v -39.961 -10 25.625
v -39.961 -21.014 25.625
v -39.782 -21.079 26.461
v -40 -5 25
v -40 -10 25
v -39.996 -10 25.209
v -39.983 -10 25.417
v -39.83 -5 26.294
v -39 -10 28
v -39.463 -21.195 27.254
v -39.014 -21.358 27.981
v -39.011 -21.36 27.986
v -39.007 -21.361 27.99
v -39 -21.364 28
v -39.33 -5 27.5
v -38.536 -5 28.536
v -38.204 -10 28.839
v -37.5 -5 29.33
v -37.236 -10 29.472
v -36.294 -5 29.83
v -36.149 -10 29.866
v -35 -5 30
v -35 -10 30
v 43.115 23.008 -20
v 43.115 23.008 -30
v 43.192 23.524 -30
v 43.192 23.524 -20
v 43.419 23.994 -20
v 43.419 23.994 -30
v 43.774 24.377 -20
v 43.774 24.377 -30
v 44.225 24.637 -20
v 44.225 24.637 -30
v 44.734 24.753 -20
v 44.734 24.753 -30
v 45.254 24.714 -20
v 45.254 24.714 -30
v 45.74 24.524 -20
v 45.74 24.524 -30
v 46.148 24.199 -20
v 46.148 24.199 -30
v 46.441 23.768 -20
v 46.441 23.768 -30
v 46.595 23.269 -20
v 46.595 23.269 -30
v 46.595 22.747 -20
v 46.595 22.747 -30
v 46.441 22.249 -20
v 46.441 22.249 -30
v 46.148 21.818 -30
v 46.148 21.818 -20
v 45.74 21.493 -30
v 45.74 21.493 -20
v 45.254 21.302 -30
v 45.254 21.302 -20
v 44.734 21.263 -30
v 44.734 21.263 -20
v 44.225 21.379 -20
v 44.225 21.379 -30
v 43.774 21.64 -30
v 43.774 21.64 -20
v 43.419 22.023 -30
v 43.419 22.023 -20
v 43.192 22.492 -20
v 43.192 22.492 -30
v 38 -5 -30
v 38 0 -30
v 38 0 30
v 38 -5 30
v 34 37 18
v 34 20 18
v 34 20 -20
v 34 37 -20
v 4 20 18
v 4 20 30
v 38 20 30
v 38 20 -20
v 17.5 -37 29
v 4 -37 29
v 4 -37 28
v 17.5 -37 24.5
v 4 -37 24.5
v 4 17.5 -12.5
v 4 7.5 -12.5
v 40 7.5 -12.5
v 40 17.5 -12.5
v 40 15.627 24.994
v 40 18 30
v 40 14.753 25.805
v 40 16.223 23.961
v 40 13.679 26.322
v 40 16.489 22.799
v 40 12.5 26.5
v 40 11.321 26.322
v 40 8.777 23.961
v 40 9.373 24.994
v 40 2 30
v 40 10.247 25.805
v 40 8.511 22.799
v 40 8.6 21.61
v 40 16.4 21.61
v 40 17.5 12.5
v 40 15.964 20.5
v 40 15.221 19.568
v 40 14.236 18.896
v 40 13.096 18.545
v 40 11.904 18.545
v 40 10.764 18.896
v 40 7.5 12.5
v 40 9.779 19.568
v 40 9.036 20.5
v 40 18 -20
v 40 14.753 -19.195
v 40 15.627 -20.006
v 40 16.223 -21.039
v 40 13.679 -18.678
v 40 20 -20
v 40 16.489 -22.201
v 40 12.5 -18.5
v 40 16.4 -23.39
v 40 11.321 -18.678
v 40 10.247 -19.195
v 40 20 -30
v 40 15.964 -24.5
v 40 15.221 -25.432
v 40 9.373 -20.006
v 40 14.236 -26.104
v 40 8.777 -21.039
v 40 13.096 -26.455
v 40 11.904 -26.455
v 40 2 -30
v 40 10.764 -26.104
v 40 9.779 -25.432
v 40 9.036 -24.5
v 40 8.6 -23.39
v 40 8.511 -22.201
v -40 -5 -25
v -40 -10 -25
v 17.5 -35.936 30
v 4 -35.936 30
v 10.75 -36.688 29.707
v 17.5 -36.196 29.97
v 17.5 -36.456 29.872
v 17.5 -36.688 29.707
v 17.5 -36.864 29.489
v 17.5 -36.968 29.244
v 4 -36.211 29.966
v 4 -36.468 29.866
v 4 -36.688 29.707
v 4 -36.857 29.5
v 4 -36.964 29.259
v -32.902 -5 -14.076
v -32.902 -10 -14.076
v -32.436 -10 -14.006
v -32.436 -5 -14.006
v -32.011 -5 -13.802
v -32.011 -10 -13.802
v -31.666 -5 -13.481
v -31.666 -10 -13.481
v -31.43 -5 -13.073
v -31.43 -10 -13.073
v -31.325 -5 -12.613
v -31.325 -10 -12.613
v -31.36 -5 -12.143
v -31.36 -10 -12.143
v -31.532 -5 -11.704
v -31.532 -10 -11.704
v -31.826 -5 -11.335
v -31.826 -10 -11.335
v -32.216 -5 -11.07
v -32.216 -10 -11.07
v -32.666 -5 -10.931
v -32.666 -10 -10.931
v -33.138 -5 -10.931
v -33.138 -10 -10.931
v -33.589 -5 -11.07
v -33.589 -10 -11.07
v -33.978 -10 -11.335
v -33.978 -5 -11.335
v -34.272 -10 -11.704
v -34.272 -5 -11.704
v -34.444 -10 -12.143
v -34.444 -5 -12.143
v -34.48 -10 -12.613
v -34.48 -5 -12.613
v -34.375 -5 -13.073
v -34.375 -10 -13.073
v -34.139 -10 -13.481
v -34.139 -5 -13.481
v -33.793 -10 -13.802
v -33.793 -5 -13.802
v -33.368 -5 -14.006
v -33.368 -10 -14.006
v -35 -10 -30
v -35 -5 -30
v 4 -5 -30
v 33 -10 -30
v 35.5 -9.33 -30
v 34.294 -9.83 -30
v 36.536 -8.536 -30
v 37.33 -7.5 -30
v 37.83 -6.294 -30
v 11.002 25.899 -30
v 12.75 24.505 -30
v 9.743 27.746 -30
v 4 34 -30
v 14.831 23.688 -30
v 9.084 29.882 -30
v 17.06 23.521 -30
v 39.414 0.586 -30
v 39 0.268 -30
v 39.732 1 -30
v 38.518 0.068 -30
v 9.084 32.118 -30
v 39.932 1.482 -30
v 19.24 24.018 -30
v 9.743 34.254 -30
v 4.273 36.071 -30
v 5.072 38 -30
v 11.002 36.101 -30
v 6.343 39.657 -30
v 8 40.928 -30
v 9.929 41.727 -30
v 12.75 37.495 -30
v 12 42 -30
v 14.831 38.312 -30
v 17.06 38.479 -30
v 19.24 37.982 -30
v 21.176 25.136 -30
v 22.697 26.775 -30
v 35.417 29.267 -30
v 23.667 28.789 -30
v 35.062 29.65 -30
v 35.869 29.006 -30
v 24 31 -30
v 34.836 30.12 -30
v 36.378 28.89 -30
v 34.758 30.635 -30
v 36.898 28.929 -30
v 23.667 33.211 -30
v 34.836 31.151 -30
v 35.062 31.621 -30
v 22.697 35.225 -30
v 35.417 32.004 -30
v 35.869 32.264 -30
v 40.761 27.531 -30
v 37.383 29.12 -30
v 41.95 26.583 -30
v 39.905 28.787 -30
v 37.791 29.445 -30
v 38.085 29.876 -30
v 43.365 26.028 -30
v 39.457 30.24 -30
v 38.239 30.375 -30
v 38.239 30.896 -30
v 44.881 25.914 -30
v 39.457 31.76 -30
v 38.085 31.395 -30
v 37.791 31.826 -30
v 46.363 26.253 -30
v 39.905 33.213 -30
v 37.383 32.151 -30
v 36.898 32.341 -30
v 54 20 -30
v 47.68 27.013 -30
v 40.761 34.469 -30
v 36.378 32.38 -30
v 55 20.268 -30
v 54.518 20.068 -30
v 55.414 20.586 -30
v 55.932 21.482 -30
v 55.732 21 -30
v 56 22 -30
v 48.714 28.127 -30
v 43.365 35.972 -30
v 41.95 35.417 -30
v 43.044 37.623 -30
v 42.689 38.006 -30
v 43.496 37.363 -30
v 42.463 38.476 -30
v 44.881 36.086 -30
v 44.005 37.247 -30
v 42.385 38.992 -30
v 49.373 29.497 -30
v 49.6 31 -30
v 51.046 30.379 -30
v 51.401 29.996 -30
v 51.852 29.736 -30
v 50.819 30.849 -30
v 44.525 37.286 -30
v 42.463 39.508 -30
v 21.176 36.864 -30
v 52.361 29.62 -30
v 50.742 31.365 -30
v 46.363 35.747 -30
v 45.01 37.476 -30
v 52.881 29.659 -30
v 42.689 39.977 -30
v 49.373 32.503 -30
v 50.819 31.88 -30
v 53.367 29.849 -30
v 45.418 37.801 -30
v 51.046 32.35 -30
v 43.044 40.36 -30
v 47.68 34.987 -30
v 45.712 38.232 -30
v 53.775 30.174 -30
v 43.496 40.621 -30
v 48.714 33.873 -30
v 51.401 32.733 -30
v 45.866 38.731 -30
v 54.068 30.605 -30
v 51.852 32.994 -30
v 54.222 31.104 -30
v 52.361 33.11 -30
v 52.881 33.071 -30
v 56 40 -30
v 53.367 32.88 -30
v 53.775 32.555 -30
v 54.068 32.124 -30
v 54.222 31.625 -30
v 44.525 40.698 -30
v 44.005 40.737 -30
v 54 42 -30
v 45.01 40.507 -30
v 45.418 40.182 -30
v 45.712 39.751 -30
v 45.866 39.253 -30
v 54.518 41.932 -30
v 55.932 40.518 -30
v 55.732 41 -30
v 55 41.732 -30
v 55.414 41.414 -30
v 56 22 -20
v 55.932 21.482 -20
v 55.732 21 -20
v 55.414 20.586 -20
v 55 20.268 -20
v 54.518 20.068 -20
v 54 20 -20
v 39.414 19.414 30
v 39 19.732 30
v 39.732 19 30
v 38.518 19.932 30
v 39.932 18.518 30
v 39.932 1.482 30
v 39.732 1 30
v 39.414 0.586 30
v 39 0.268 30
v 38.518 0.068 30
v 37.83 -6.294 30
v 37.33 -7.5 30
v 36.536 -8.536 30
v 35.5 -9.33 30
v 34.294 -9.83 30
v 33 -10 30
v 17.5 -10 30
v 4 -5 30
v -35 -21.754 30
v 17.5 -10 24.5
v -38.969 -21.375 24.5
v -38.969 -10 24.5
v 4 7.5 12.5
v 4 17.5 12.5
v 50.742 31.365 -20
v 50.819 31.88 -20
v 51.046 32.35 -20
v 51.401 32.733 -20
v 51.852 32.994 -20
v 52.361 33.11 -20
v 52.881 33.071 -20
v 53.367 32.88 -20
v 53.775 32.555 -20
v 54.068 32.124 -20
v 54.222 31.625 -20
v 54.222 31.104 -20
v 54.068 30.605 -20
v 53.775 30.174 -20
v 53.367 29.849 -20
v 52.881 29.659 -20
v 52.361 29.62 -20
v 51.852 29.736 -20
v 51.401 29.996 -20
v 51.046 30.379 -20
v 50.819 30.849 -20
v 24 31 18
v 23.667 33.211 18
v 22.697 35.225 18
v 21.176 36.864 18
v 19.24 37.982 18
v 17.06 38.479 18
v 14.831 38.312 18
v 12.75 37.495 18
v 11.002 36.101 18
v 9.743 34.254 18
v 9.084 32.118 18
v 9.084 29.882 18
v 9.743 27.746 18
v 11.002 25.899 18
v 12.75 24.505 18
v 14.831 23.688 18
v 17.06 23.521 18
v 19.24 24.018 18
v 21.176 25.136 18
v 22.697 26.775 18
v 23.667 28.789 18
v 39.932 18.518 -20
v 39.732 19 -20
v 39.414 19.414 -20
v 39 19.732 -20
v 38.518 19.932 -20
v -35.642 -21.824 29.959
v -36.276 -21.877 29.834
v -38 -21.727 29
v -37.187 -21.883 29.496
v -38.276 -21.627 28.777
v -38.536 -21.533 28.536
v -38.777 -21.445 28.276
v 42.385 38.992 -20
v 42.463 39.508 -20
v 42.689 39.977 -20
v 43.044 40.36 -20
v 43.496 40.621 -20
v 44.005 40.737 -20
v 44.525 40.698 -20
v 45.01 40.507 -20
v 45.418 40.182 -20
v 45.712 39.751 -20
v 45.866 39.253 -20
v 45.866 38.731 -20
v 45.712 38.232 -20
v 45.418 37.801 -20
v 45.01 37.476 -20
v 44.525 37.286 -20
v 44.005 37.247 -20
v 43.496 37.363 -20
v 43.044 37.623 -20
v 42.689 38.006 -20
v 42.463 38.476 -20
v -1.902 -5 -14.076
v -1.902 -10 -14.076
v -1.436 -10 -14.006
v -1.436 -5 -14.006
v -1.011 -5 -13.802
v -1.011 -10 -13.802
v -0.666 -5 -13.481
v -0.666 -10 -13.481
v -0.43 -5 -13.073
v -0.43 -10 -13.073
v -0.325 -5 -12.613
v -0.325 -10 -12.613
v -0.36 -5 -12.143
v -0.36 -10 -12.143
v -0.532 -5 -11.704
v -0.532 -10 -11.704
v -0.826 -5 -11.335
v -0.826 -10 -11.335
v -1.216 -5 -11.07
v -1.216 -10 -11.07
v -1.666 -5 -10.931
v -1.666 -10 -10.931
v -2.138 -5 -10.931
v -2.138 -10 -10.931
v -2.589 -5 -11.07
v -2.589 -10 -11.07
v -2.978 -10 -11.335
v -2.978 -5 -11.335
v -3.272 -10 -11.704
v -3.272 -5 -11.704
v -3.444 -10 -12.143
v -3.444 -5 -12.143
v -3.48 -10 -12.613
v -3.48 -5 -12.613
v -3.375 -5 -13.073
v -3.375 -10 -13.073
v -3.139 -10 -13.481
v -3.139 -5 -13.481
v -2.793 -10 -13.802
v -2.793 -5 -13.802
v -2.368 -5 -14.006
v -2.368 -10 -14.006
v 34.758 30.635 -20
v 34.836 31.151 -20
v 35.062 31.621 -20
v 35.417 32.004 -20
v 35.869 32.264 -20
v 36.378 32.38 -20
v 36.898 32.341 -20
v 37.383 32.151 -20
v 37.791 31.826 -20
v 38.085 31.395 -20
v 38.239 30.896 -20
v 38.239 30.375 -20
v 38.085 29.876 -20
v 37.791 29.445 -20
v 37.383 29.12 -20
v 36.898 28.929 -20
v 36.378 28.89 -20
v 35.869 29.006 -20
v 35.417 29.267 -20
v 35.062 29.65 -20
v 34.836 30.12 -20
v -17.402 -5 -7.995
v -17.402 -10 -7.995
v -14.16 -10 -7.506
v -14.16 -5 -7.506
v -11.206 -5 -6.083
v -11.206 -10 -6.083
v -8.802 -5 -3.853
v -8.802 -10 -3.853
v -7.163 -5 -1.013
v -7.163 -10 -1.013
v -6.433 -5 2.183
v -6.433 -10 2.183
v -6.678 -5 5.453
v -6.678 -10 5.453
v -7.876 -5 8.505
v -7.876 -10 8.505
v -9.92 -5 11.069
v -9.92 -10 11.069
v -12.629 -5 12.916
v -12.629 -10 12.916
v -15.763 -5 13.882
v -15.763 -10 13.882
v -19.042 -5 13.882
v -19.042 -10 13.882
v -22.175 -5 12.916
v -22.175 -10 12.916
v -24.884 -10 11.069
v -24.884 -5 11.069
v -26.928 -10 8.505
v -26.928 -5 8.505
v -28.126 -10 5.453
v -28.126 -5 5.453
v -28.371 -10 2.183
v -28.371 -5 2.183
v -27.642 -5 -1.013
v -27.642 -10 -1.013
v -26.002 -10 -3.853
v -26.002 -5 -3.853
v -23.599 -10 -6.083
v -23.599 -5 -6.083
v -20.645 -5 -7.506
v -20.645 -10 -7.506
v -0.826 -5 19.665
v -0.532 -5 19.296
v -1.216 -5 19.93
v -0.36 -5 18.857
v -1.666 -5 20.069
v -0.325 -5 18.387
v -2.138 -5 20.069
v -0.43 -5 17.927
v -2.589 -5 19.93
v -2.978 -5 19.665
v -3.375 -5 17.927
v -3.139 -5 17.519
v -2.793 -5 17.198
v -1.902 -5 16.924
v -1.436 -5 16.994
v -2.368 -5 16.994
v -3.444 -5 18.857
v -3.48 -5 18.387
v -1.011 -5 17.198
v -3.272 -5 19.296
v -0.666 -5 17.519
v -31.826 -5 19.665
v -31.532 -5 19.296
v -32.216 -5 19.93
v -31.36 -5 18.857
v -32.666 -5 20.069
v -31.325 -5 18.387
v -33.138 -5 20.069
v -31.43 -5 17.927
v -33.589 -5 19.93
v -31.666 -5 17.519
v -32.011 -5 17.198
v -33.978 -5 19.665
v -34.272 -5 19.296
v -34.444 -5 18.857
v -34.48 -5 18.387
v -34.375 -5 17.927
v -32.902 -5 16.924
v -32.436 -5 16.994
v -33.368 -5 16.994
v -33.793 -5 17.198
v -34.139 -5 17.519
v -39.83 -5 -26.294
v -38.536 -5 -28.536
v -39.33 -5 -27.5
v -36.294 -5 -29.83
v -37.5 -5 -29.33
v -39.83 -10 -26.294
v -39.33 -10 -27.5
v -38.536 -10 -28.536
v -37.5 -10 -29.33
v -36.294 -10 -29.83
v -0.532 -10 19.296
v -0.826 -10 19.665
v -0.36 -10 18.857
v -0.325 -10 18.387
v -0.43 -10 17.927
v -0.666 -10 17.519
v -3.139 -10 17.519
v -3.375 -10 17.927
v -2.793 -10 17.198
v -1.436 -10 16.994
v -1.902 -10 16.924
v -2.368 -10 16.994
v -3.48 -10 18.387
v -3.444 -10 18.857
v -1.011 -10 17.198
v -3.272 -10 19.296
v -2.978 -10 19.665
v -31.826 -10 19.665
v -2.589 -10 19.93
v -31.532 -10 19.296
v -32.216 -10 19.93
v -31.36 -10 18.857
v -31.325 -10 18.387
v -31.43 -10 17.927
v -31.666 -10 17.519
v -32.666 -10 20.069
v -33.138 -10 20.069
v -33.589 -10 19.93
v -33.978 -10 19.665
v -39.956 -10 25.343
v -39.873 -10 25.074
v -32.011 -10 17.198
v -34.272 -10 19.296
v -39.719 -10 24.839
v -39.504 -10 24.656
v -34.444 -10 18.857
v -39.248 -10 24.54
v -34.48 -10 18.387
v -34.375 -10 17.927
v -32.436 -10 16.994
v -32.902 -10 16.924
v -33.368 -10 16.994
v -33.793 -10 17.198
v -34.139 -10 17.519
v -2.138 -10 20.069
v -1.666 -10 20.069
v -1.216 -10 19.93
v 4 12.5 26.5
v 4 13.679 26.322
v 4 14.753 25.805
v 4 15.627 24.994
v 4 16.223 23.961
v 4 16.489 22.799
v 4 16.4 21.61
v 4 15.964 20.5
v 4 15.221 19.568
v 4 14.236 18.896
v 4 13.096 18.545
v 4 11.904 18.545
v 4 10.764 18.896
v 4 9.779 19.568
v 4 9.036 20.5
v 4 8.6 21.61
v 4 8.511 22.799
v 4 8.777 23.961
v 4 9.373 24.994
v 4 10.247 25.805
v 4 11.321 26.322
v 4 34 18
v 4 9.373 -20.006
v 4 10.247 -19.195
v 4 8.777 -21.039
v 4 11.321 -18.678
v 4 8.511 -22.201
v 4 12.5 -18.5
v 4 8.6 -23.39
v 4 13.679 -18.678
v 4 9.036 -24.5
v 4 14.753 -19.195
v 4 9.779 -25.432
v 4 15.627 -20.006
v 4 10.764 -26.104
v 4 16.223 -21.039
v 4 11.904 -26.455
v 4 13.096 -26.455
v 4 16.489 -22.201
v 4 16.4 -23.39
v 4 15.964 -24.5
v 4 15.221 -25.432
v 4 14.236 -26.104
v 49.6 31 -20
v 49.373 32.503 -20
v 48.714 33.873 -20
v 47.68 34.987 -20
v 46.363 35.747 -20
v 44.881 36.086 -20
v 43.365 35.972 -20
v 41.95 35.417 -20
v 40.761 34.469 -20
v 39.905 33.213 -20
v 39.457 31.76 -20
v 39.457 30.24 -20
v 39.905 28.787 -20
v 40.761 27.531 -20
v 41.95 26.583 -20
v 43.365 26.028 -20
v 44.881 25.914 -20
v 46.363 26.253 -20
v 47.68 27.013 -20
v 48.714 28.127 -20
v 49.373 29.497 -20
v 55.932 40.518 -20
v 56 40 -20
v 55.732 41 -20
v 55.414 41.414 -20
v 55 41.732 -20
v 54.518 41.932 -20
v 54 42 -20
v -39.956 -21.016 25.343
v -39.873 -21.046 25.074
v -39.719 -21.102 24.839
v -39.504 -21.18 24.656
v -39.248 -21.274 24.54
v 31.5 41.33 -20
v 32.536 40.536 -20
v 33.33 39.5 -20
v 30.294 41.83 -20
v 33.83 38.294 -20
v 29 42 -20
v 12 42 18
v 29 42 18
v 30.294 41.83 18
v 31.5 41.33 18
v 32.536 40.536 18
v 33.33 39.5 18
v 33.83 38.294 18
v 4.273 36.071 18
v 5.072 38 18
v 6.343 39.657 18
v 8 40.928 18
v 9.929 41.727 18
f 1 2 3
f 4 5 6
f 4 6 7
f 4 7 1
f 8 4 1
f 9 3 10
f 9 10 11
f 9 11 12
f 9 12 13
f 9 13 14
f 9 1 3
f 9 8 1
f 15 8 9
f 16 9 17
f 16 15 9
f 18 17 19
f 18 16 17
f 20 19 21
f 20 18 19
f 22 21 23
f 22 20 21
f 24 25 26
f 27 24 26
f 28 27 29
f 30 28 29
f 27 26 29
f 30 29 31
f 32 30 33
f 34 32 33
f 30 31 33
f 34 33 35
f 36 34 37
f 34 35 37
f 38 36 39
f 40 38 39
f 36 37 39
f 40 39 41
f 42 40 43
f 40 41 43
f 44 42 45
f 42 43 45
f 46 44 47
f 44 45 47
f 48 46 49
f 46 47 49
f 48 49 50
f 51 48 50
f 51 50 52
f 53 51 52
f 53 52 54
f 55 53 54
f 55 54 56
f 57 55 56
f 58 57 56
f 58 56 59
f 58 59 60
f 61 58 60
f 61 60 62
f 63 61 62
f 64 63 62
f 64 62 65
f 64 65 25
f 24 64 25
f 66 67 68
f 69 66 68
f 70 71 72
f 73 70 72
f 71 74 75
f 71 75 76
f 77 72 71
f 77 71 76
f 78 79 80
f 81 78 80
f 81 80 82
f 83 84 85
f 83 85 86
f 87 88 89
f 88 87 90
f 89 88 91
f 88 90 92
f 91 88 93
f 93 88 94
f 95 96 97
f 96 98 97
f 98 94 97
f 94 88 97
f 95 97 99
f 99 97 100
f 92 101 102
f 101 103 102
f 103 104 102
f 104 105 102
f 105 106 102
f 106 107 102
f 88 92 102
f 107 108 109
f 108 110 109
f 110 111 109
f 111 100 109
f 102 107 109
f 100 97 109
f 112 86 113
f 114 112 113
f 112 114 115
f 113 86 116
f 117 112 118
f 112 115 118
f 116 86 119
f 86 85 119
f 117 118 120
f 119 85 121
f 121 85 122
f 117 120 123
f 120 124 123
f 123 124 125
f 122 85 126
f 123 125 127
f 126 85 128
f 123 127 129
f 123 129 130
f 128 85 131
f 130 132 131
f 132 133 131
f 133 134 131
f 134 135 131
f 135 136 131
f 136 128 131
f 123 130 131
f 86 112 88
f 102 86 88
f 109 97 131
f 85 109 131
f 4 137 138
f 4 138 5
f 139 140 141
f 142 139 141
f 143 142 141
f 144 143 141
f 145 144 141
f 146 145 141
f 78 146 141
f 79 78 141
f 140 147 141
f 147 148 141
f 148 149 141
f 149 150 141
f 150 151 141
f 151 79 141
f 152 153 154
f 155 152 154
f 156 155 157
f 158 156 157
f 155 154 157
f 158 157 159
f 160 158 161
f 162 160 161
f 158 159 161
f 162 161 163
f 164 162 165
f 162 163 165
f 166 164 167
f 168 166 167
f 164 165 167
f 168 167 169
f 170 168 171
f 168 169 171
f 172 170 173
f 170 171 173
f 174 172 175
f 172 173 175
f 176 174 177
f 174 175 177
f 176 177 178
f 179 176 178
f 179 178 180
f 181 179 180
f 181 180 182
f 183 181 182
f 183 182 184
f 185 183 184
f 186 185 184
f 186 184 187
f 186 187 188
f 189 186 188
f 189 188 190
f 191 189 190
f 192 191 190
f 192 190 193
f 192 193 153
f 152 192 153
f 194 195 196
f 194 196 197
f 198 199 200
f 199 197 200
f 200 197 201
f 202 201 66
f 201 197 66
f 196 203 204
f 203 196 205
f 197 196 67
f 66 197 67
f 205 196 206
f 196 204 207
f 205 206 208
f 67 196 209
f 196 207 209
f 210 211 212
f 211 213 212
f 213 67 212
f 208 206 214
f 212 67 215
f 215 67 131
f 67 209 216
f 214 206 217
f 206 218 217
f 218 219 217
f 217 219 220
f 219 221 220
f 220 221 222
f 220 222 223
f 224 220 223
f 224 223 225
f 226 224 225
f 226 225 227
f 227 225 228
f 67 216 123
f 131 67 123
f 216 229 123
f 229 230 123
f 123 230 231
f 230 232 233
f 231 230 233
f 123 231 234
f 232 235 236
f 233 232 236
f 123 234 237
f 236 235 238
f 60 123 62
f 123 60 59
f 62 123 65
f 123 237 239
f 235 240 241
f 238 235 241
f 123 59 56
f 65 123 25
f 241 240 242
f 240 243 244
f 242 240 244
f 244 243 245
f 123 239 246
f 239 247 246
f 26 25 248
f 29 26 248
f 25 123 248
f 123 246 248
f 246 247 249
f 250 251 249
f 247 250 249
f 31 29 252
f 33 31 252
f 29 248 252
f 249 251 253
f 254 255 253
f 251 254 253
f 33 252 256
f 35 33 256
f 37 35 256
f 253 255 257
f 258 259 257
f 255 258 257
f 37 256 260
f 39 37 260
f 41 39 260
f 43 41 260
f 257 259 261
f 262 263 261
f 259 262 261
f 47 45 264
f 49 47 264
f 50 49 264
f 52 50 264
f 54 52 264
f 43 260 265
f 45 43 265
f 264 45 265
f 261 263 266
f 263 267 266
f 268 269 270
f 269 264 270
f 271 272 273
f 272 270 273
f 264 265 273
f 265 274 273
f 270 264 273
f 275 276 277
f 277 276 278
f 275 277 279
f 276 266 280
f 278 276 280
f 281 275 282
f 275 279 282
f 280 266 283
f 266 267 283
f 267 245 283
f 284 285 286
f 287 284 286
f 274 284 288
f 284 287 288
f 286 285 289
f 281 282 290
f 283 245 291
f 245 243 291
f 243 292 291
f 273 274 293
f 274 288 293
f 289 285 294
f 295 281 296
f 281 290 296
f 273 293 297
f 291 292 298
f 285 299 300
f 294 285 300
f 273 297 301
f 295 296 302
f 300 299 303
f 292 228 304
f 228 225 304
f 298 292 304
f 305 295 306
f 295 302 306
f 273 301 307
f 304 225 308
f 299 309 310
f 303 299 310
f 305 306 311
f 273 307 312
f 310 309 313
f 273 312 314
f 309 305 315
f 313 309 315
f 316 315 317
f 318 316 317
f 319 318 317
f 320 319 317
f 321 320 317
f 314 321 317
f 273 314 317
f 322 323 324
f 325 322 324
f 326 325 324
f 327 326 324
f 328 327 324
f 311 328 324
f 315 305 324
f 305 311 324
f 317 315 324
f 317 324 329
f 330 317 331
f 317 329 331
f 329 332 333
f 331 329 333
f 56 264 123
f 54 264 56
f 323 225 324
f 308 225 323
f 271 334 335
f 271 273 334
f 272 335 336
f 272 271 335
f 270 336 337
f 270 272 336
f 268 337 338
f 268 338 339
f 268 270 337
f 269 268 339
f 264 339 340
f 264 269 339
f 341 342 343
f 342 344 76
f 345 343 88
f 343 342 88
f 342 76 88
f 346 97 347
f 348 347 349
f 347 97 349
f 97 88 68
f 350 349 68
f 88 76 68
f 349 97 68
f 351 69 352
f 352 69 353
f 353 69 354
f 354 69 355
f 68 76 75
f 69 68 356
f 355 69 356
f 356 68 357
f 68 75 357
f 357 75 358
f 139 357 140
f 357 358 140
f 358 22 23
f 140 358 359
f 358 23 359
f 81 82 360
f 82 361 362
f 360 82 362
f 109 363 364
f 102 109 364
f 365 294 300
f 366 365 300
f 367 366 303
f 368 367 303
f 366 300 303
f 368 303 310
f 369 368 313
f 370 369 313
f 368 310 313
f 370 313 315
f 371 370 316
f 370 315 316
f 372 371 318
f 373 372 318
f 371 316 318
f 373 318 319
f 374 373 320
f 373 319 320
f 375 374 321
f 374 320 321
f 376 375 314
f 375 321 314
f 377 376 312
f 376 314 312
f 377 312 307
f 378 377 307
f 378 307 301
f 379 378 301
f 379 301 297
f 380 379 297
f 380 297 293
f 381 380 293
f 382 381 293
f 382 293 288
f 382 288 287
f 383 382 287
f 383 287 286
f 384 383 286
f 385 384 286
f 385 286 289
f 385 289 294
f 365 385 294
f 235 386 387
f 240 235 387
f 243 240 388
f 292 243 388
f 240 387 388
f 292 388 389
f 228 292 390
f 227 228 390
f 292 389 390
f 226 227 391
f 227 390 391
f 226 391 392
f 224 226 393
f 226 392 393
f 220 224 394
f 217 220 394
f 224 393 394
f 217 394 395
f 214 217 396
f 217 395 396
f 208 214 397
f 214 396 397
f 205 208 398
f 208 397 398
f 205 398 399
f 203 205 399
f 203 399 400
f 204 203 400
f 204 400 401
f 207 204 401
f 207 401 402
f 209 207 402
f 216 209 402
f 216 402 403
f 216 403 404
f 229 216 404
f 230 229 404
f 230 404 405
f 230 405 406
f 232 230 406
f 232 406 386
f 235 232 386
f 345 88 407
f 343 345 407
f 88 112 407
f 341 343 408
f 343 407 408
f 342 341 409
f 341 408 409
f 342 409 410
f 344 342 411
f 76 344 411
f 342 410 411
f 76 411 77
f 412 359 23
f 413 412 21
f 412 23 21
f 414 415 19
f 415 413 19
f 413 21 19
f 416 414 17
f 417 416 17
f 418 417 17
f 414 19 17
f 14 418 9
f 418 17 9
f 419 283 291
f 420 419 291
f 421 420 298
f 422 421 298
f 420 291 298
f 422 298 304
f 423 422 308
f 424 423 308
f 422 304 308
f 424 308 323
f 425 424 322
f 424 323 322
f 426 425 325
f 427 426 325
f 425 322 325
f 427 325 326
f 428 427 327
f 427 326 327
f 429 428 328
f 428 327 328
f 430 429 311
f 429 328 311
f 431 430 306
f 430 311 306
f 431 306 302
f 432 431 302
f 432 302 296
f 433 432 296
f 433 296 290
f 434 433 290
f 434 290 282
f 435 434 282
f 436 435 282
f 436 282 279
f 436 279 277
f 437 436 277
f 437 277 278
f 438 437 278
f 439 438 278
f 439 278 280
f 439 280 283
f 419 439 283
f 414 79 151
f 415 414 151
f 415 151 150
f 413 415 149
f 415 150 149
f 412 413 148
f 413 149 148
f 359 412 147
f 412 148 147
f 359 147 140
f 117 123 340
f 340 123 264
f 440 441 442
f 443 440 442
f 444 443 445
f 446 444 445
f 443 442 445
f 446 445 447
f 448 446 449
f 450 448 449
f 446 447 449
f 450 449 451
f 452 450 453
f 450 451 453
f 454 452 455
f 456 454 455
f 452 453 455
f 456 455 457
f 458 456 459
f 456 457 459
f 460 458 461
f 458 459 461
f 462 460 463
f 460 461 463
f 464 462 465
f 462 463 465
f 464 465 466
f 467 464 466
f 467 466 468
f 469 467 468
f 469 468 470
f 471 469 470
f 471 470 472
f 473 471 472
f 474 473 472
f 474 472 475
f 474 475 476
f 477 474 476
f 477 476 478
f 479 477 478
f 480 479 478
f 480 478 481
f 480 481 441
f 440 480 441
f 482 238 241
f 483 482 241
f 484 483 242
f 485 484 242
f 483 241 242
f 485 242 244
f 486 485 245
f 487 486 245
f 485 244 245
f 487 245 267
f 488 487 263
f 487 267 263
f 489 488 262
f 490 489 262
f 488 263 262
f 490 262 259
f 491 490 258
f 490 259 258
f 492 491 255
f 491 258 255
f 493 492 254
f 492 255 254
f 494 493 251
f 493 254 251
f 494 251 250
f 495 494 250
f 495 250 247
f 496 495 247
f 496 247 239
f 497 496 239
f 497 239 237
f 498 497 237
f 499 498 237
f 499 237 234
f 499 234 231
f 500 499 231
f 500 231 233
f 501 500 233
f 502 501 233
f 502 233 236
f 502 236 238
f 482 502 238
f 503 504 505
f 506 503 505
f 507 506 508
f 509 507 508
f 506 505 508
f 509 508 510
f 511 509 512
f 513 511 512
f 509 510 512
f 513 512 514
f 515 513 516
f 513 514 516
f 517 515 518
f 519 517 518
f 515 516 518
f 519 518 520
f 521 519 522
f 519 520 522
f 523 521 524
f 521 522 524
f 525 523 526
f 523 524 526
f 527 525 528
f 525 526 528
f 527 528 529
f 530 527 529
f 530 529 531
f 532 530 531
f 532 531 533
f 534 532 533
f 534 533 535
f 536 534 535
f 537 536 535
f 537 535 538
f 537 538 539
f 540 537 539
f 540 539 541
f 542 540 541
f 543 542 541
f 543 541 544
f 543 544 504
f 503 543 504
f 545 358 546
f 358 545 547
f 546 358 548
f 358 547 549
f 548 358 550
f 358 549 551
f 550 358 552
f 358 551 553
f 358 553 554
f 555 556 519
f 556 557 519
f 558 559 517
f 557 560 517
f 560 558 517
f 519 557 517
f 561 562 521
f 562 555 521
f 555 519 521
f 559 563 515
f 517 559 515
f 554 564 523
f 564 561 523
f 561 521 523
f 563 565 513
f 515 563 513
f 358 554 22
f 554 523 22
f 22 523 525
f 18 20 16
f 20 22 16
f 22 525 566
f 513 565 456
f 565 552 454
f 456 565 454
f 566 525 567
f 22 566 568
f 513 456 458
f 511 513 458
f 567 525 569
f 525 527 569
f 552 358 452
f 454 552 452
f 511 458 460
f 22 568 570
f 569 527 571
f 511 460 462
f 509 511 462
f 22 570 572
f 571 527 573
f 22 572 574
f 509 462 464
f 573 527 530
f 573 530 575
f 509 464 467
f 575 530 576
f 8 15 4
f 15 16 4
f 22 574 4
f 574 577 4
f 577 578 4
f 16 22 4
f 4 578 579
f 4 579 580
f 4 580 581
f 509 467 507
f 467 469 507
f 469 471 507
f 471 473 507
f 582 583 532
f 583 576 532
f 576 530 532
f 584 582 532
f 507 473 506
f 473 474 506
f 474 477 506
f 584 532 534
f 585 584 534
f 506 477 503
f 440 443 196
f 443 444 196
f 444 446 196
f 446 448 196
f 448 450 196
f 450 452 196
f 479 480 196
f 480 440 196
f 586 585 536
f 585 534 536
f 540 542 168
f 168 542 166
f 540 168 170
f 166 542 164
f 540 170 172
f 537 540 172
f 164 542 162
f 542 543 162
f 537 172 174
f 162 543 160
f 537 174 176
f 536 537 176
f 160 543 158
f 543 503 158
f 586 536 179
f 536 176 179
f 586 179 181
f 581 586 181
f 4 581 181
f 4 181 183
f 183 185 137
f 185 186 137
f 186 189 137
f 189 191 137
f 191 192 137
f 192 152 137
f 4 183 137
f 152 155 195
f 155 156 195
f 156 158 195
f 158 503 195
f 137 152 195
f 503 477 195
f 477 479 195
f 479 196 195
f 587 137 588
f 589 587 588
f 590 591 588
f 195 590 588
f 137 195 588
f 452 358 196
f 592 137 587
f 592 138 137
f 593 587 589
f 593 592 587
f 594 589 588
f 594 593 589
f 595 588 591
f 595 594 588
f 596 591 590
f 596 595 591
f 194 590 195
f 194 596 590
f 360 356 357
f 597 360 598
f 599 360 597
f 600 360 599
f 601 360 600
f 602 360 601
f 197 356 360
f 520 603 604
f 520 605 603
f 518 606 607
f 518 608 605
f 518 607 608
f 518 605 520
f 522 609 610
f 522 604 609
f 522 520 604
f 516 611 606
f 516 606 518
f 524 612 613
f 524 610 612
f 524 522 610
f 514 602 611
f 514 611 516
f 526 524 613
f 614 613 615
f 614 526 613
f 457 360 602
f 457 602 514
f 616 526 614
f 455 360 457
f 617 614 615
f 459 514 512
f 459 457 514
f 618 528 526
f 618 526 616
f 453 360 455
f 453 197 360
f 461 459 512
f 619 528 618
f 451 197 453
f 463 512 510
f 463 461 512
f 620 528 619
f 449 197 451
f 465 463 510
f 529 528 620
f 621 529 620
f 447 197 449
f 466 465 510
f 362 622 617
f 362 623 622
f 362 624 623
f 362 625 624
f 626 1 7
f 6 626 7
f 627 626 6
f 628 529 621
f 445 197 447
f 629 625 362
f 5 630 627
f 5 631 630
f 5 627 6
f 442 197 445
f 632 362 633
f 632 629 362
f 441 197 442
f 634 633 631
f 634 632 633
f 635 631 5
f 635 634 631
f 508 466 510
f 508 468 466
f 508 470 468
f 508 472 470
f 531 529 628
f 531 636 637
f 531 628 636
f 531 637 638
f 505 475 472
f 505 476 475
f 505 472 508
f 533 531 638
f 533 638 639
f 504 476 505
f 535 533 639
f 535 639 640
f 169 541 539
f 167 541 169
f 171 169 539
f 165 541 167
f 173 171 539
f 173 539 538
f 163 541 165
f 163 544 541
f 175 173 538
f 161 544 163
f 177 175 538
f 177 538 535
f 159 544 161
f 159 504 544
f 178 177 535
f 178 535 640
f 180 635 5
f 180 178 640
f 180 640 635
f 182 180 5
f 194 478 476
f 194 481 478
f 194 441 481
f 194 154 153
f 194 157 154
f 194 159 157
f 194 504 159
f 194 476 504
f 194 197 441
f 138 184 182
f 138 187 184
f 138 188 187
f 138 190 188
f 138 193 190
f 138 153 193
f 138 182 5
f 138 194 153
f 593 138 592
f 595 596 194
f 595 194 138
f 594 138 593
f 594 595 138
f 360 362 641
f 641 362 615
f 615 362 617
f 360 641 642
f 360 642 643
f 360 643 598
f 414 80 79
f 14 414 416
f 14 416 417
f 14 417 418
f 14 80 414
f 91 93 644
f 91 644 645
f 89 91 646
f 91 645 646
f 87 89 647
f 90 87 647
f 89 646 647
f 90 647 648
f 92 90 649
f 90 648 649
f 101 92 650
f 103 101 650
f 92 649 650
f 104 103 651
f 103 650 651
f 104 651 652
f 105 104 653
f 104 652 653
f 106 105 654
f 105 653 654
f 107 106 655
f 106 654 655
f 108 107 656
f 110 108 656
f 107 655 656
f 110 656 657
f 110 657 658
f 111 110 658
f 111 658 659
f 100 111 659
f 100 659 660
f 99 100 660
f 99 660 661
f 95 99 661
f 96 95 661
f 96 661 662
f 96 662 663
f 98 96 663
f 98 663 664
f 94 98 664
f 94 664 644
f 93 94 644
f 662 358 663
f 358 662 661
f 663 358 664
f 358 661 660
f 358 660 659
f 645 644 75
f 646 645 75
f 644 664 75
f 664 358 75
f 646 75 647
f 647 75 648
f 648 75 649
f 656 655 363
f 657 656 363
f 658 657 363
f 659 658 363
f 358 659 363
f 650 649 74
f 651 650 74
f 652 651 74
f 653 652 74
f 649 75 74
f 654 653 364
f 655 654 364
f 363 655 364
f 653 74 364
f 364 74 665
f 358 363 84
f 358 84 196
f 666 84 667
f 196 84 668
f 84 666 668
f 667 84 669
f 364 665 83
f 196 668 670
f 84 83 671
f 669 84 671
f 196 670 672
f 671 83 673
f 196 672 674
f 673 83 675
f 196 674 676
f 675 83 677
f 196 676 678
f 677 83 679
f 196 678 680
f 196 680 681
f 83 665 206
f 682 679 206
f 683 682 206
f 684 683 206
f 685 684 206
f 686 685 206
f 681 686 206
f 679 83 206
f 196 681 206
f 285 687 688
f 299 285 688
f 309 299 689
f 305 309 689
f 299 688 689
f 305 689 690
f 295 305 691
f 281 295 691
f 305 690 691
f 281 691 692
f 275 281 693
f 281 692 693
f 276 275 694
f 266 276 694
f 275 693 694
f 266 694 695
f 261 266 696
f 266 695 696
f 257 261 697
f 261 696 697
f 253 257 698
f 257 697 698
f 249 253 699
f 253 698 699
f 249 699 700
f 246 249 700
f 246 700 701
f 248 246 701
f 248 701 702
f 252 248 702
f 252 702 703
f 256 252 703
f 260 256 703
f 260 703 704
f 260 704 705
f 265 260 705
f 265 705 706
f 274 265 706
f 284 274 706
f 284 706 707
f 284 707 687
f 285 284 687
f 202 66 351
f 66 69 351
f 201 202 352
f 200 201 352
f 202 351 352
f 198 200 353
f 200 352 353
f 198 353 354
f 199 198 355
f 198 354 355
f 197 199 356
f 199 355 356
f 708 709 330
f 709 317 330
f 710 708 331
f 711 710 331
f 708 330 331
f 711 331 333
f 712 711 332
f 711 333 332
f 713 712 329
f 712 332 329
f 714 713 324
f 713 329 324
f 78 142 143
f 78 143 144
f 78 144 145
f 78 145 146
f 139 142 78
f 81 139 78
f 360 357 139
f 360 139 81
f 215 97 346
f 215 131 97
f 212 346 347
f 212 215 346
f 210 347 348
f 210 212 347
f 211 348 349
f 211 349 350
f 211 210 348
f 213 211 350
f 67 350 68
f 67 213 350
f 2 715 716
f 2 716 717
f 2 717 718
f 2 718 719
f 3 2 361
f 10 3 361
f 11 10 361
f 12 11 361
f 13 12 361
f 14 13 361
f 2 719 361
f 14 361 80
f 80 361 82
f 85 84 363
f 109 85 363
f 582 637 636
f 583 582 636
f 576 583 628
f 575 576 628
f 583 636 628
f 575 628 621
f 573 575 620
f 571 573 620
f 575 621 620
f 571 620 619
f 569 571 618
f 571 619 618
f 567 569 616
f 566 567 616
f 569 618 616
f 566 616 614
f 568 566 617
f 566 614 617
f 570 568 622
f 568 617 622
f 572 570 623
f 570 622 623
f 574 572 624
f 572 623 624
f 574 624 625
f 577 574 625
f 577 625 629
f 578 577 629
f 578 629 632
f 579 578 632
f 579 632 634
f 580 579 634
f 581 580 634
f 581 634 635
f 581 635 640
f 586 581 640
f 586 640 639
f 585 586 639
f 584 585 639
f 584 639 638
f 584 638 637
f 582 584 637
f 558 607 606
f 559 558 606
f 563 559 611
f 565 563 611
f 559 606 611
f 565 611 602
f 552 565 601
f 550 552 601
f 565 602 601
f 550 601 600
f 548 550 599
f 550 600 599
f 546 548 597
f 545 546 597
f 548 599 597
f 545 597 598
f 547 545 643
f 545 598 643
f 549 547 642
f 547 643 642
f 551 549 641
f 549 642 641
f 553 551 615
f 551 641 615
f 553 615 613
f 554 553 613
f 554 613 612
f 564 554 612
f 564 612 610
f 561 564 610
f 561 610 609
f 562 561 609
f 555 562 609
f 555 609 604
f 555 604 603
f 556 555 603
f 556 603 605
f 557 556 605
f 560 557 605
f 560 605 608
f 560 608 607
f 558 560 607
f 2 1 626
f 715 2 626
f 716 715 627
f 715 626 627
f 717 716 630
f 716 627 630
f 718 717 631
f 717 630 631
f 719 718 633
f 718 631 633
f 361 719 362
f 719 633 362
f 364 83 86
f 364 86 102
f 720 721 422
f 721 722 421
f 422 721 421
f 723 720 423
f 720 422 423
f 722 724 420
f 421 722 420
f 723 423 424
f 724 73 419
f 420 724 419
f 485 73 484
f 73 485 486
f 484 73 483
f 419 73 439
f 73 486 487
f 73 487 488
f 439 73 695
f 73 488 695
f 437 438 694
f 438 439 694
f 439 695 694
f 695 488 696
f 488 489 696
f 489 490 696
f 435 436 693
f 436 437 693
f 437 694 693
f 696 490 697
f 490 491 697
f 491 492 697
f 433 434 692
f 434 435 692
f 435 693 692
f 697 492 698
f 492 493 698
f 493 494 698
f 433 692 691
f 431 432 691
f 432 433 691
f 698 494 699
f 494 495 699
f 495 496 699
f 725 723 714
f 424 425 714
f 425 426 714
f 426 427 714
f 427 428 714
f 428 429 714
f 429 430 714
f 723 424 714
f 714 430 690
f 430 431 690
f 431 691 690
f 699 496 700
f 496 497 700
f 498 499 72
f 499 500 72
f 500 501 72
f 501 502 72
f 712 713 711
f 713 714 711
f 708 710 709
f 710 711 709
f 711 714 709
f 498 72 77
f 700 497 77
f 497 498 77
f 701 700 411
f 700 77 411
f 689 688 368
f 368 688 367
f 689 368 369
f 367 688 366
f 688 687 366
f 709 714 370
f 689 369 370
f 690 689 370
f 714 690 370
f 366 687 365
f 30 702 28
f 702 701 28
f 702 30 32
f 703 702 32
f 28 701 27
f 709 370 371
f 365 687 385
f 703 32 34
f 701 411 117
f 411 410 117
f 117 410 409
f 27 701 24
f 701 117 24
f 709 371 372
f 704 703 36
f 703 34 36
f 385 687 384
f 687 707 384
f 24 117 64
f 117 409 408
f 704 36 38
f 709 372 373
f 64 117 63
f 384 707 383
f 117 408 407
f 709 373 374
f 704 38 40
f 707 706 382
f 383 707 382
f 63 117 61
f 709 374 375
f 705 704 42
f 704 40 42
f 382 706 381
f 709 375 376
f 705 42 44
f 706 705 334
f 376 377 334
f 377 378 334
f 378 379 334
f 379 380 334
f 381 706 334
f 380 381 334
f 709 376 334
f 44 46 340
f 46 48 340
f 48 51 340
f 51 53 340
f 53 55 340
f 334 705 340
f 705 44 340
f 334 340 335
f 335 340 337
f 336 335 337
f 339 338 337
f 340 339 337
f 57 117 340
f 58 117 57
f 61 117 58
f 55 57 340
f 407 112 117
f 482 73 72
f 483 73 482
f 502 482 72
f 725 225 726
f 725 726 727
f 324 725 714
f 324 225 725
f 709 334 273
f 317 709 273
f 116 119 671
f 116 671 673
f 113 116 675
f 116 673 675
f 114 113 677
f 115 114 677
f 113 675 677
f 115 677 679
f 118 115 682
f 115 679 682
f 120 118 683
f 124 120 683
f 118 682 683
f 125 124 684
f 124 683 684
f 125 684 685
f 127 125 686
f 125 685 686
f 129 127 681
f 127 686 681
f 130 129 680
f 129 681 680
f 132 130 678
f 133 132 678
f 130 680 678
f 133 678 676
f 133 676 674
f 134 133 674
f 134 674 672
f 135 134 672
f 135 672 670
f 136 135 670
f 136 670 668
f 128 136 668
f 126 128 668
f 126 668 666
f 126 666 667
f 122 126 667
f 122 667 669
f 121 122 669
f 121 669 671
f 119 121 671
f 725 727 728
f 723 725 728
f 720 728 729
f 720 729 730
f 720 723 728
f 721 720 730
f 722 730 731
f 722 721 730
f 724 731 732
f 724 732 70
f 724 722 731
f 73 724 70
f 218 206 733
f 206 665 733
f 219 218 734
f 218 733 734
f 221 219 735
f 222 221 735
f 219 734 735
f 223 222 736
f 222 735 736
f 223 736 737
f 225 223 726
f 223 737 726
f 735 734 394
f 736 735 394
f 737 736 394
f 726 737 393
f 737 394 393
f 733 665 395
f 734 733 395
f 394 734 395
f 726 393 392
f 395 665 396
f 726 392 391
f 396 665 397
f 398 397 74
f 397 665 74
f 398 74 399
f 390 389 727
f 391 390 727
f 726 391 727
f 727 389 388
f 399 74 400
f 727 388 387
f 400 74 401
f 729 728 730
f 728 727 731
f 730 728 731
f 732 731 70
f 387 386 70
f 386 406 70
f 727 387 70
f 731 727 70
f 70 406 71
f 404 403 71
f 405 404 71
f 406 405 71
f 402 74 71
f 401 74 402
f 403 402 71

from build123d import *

# Parameters (mm, degrees)
SKETCH_1_W           = 80
SKETCH_1_H           = 60
EXTRUDE_1_DEPTH      = 5
SKETCH_2_R           = 1.75
SKETCH_2_R_2         = 11
CUT_EXTRUDE_1_DEPTH  = 51.249378106
SKETCH_3_W           = 36
SKETCH_3_H           = 60
EXTRUDE_2_DEPTH      = 15
SKETCH_4_R           = 4
SKETCH_4_W           = 25
SKETCH_4_H           = 10
CUT_EXTRUDE_7_DEPTH  = 57.885850613
EXTRUDE_6_DEPTH      = 22
SKETCH_15_R          = 7.5
CUT_EXTRUDE_8_DEPTH  = 85.876380696
SKETCH_16_R          = 5.1
CUT_EXTRUDE_9_DEPTH  = 87.02325267
FILLET_1_R           = 8
FILLET_2_R           = 5
FILLET_3_R           = 2
FILLET_4_R           = 2
SKETCH_20_R          = 1.75
CUT_EXTRUDE_11_DEPTH = 93.195444573
SKETCH_23_W          = 78
SKETCH_23_H          = 60
EXTRUDE_8_DEPTH      = 10
SKETCH_26_W          = 44
SKETCH_26_H          = 60
CUT_EXTRUDE_13_DEPTH = 10
EXTRUDE_9_DEPTH      = 5
FILLET_5_R           = 5
SKETCH_25_R          = 1.581789818
SKETCH_25_R_2        = 11
CUT_EXTRUDE_14_DEPTH = 83.097503007
CUT_EXTRUDE_15_DEPTH = 1.5
EXTRUDE_10_DEPTH     = 2
FILLET_6_R           = 1
CUT_EXTRUDE_16_DEPTH = 83.097503007
EXTRUDE_11_DEPTH     = 13.5


with BuildPart() as part:
    # 草图1 → 凸台-拉伸1 (new body)
    with BuildSketch(Plane(origin=(0, 0, 0), x_dir=(1, 0, 0), z_dir=(0, 1, 0))):
        Rectangle(SKETCH_1_W, SKETCH_1_H)
    extrude(amount=EXTRUDE_1_DEPTH)

    # 草图2 → 切除-拉伸1 (cut, through all)
    with BuildSketch(Plane(origin=(0, 5, 0), x_dir=(1, 0, 0), z_dir=(0, 1, 0))):
        with Locations(Location((-3, 15.5, 0), (0, 0, 270))):
            Circle(SKETCH_2_R)
        with Locations(Location((-3, -15.5, 0), (0, 0, 270))):
            Circle(SKETCH_2_R)
        with Locations(Location((-34, -15.5, 0), (0, 0, 270))):
            Circle(SKETCH_2_R)
        with Locations(Location((-34, 15.5, 0), (0, 0, 270))):
            Circle(SKETCH_2_R)
        with Locations(Location((-18.5, 0, 0), (0, 0, 270))):
            Circle(SKETCH_2_R_2)
    extrude(amount=-CUT_EXTRUDE_1_DEPTH, mode=Mode.SUBTRACT)

    # 草图3 → 凸台-拉伸2 (add)
    with BuildSketch(Plane(origin=(0, 5, 0), x_dir=(1, 0, 0), z_dir=(0, 1, 0))):
        with Locations((22, 0)):
            Rectangle(SKETCH_3_W, SKETCH_3_H)
    extrude(amount=EXTRUDE_2_DEPTH)

    # 草图4 → 切除-拉伸7 (cut, through all)
    with BuildSketch(Plane.ZY.offset(-4)):
        with Locations((-22.5, 12.5)):
            Circle(SKETCH_4_R)
        with Locations((22.5, 12.5)):
            Circle(SKETCH_4_R)
        with Locations((0, 12.5)):
            Rectangle(SKETCH_4_W, SKETCH_4_H)
    extrude(amount=-CUT_EXTRUDE_7_DEPTH, mode=Mode.SUBTRACT)

    # 草图14 → 凸台-拉伸6 (add)
    with BuildSketch(Plane(origin=(0, 20, 0), x_dir=(1, 0, 0), z_dir=(0, 1, 0))):
        Polygon((4, 30), (4, -18), (34, -18), (34, 20), (56, 20), (56, 30), align=None)
    extrude(amount=EXTRUDE_6_DEPTH)

    # 草图15 → 切除-拉伸8 (cut, through all)
    with BuildSketch(Plane.XY.offset(18)):
        with Locations((16.5, 31)):
            Circle(SKETCH_15_R)
    extrude(amount=-CUT_EXTRUDE_8_DEPTH, mode=Mode.SUBTRACT)

    # 草图16 → 切除-拉伸9 (cut, through all)
    with BuildSketch(Plane.XY.offset(-20)):
        with Locations((44.5, 31)):
            Circle(SKETCH_16_R)
    extrude(amount=-CUT_EXTRUDE_9_DEPTH, mode=Mode.SUBTRACT)

    # 圆角1
    fillet_1_edges = [part.edges().sort_by_distance(p)[0] for p in [
        (4, 42, -6),
    ]]
    fillet(fillet_1_edges, radius=FILLET_1_R)

    # 圆角2
    fillet_2_edges = [part.edges().sort_by_distance(p)[0] for p in [
        (34, 42, -1),
    ]]
    fillet(fillet_2_edges, radius=FILLET_2_R)

    # 圆角3
    fillet_3_edges = [part.edges().sort_by_distance(p)[0] for p in [
        (56, 42, -25),
    ]]
    fillet(fillet_3_edges, radius=FILLET_3_R)

    # 圆角4
    fillet_4_edges = [part.edges().sort_by_distance(p)[0] for p in [
        (40, 20, 5),
        (40, 0, 0),
        (56, 20, -25),
    ]]
    fillet(fillet_4_edges, radius=FILLET_4_R)

    # 草图20 → 切除-拉伸11 (cut, through all)
    with BuildSketch(Plane(origin=(0, 0, -30), x_dir=(-1, 0, 0), z_dir=(0, 0, -1))):
        with Locations((-44.135340411, 38.99168464)):
            Circle(SKETCH_20_R)
        with Locations((-36.50831536, 30.635340412)):
            Circle(SKETCH_20_R)
        with Locations((-44.864659589, 23.00831536)):
            Circle(SKETCH_20_R)
        with Locations((-52.49168464, 31.364659589)):
            Circle(SKETCH_20_R)
    extrude(amount=-CUT_EXTRUDE_11_DEPTH, mode=Mode.SUBTRACT)

    # 草图23 → 凸台-拉伸8 (add)
    with BuildSketch(Plane.XZ):
        with Locations((-1, 0)):
            Rectangle(SKETCH_23_W, SKETCH_23_H)
    extrude(amount=EXTRUDE_8_DEPTH)

    # 草图26 → 切除-拉伸13 (cut)
    with BuildSketch(Plane(origin=(0, 5, 0), x_dir=(1, 0, 0), z_dir=(0, 1, 0))):
        with Locations((-18, 0)):
            Rectangle(SKETCH_26_W, SKETCH_26_H)
    extrude(amount=-CUT_EXTRUDE_13_DEPTH, mode=Mode.SUBTRACT)

    # 草图29 → 凸台-拉伸9 (add)
    with BuildSketch(Plane.XY.offset(23)):
        Polygon((-40, -5), (-40, -21), (4, -37), (4, -5), align=None)
    extrude(amount=EXTRUDE_9_DEPTH)

    # 圆角5
    fillet_5_edges = [part.edges().sort_by_distance(p)[0] for p in [
        (38, -10, 0),
        (-40, -7.5, 30),
        (-40, -7.5, -30),
    ]]
    fillet(fillet_5_edges, radius=FILLET_5_R)

    # 草图25 → 切除-拉伸14 (cut, through all)
    with BuildSketch(Plane.XZ.offset(10)):
        with Locations(Location((-32.902220535, -12.494692857, 0), (0, 0, 270))):
            Circle(SKETCH_25_R)
        with Locations(Location((-1.902220535, 18.505307143, 0), (0, 0, 270))):
            Circle(SKETCH_25_R)
        with Locations(Location((-32.902220535, 18.505307143, 0), (0, 0, 270))):
            Circle(SKETCH_25_R)
        with Locations(Location((-1.902220535, -12.494692857, 0), (0, 0, 270))):
            Circle(SKETCH_25_R)
        with Locations(Location((-17.402220535, 3.005307143, 0), (0, 0, 270))):
            Circle(SKETCH_25_R_2)
    extrude(amount=-CUT_EXTRUDE_14_DEPTH, mode=Mode.SUBTRACT)

    # 草图30 → 切除-拉伸15 (cut)
    with BuildSketch(Plane(origin=(0, 0, 23), x_dir=(-1, 0, 0), z_dir=(0, 0, -1))):
        Polygon((-4, -10), (40, -10), (40, -21), (-4, -37), align=None)
    extrude(amount=-CUT_EXTRUDE_15_DEPTH, mode=Mode.SUBTRACT)

    # 草图31 → 凸台-拉伸10 (add)
    with BuildSketch(Plane.XY.offset(28)):
        Polygon((-39.701600618, -21.108508866), (-39.701600618, -10), (4, -10), (4, -37), align=None)
    extrude(amount=EXTRUDE_10_DEPTH)

    # 圆角6
    # the kernel refuses this fillet: 1 mm, written as the material it takes off along each edge
    with BuildSketch(Plane(origin=(-40, -10, 24.5), x_dir=(1, 0, 0), z_dir=(0, -1, 0))) as fillet_6_piece_1:
        with BuildLine():
            CenterArc((1.031373033, 1), FILLET_6_R, 172.819244219, 97.180755781)
            Line((0.039216292, 1.125), (-0.059999382, 1.1375))
            ThreePointArc((-0.059999382, 1.1375), (-0.1, 0.5), (-0.1, 0))
            Line((-0.1, 0), (0, -0.1))
            Line((0, -0.1), (1.031373033, -0.1))
            Line((1.031373033, -0.1), (1.031373033, 0))
        make_face()
    extrude(amount=13.814208278, mode=Mode.SUBTRACT)
    with BuildSketch(Plane(origin=(6.349483559, -37.854357658, 30), x_dir=(0.34174306308670427, 0.9397934234884371, 0), z_dir=(-0.9397934234884371, 0.3417430630867043, 0))) as fillet_6_piece_2:
        with BuildLine():
            CenterArc((FILLET_6_R, FILLET_6_R), FILLET_6_R, 180, 90)
            Line((0, FILLET_6_R), (-FILLET_6_R * 0.02, FILLET_6_R))
            Line((-FILLET_6_R * 0.02, FILLET_6_R), (-FILLET_6_R * 0.02, -FILLET_6_R * 0.02))
            Line((-FILLET_6_R * 0.02, -FILLET_6_R * 0.02), (FILLET_6_R, -FILLET_6_R * 0.02))
            Line((FILLET_6_R, -FILLET_6_R * 0.02), (FILLET_6_R, 0))
        make_face()
    extrude(amount=51.501283714, mode=Mode.SUBTRACT)
    with BuildSketch(Plane(origin=(-39.701600618, -23.49461161, 28), x_dir=(1, 0, 0), z_dir=(0, 1, 0))) as fillet_6_piece_3_section:
        with BuildLine():
            CenterArc((1, -0.954441098), FILLET_6_R, 107.361491651, 72.638508349)
            Line((0, -0.954441098), (-0.02, -0.954441098))
            Line((-0.02, -0.954441098), (-0.02, 0))
            Line((-0.02, 0), (0, 0.02))
            ThreePointArc((0, 0.02), (0.350800309, 0.02), (0.69563263, 0.019088822))
            Line((0.69563263, 0.019088822), (0.701600618, 0))
        make_face()
    fillet_6_piece_3 = extrude(amount=15.880714354, mode=Mode.PRIVATE)
    fillet_6_piece_3 = fillet_6_piece_3 - Plane(origin=(-35, -15.554254433, 25), x_dir=(0, 0, 1), z_dir=(0, -1, 0)) * Cylinder(5, 36, mode=Mode.PRIVATE)
    add(fillet_6_piece_3, mode=Mode.SUBTRACT)
    with BuildSketch(Plane(origin=(-39.701600618, -23.608508866, 30), x_dir=(1, 0, 0), z_dir=(0, 1, 0))) as fillet_6_piece_4:
        with BuildLine():
            CenterArc((FILLET_6_R, FILLET_6_R), FILLET_6_R, 180, 90)
            Line((0, FILLET_6_R), (-FILLET_6_R * 0.02, FILLET_6_R))
            Line((-FILLET_6_R * 0.02, FILLET_6_R), (-FILLET_6_R * 0.02, -FILLET_6_R * 0.02))
            Line((-FILLET_6_R * 0.02, -FILLET_6_R * 0.02), (FILLET_6_R, -FILLET_6_R * 0.02))
            Line((FILLET_6_R, -FILLET_6_R * 0.02), (FILLET_6_R, 0))
        make_face()
    extrude(amount=16.108508866, mode=Mode.SUBTRACT)

    # 草图32 → 切除-拉伸16 (cut, through all)
    with BuildSketch(Plane(origin=(0, -10, 0), x_dir=(1, 0, 0), z_dir=(0, 1, 0))):
        with BuildLine():
            Line((-39.701600618, -28.954441098), (-39.701600618, -29))
            ThreePointArc((-39.701600618, -29), (-39.408707399, -29.707106781), (-38.701600618, -30))
            Line((-38.701600618, -30), (-35, -30))
            ThreePointArc((-35, -30), (-37.236067977, -29.472135955), (-39, -28))
            ThreePointArc((-39, -28), (-39.507329909, -28.362157121), (-39.701600618, -28.954441098))
        make_face()
    extrude(amount=-CUT_EXTRUDE_16_DEPTH, mode=Mode.SUBTRACT)

    # 草图33 → 凸台-拉伸11 (add)
    with BuildSketch(Plane(origin=(4, 0, 0), x_dir=(0, 0, -1), z_dir=(1, 0, 0))):
        with BuildLine():
            Line((-30, -10), (-30, -35.935936372))
            add(Edge.make_bspline(
                [(-30, -35.935936372), (-30, -37), (-29, -37)],
                knots=[1.570796327, 1.570796327, 1.570796327, 3.141592654, 3.141592654, 3.141592654], degree=2, weights=[1, 0.707106781, 1]))
            Line((-29, -37), (-24.5, -37))
            Line((-24.5, -37), (-24.5, -10))
            Line((-24.5, -10), (-30, -10))
        make_face()
    extrude(amount=EXTRUDE_11_DEPTH)


solid = part.part
